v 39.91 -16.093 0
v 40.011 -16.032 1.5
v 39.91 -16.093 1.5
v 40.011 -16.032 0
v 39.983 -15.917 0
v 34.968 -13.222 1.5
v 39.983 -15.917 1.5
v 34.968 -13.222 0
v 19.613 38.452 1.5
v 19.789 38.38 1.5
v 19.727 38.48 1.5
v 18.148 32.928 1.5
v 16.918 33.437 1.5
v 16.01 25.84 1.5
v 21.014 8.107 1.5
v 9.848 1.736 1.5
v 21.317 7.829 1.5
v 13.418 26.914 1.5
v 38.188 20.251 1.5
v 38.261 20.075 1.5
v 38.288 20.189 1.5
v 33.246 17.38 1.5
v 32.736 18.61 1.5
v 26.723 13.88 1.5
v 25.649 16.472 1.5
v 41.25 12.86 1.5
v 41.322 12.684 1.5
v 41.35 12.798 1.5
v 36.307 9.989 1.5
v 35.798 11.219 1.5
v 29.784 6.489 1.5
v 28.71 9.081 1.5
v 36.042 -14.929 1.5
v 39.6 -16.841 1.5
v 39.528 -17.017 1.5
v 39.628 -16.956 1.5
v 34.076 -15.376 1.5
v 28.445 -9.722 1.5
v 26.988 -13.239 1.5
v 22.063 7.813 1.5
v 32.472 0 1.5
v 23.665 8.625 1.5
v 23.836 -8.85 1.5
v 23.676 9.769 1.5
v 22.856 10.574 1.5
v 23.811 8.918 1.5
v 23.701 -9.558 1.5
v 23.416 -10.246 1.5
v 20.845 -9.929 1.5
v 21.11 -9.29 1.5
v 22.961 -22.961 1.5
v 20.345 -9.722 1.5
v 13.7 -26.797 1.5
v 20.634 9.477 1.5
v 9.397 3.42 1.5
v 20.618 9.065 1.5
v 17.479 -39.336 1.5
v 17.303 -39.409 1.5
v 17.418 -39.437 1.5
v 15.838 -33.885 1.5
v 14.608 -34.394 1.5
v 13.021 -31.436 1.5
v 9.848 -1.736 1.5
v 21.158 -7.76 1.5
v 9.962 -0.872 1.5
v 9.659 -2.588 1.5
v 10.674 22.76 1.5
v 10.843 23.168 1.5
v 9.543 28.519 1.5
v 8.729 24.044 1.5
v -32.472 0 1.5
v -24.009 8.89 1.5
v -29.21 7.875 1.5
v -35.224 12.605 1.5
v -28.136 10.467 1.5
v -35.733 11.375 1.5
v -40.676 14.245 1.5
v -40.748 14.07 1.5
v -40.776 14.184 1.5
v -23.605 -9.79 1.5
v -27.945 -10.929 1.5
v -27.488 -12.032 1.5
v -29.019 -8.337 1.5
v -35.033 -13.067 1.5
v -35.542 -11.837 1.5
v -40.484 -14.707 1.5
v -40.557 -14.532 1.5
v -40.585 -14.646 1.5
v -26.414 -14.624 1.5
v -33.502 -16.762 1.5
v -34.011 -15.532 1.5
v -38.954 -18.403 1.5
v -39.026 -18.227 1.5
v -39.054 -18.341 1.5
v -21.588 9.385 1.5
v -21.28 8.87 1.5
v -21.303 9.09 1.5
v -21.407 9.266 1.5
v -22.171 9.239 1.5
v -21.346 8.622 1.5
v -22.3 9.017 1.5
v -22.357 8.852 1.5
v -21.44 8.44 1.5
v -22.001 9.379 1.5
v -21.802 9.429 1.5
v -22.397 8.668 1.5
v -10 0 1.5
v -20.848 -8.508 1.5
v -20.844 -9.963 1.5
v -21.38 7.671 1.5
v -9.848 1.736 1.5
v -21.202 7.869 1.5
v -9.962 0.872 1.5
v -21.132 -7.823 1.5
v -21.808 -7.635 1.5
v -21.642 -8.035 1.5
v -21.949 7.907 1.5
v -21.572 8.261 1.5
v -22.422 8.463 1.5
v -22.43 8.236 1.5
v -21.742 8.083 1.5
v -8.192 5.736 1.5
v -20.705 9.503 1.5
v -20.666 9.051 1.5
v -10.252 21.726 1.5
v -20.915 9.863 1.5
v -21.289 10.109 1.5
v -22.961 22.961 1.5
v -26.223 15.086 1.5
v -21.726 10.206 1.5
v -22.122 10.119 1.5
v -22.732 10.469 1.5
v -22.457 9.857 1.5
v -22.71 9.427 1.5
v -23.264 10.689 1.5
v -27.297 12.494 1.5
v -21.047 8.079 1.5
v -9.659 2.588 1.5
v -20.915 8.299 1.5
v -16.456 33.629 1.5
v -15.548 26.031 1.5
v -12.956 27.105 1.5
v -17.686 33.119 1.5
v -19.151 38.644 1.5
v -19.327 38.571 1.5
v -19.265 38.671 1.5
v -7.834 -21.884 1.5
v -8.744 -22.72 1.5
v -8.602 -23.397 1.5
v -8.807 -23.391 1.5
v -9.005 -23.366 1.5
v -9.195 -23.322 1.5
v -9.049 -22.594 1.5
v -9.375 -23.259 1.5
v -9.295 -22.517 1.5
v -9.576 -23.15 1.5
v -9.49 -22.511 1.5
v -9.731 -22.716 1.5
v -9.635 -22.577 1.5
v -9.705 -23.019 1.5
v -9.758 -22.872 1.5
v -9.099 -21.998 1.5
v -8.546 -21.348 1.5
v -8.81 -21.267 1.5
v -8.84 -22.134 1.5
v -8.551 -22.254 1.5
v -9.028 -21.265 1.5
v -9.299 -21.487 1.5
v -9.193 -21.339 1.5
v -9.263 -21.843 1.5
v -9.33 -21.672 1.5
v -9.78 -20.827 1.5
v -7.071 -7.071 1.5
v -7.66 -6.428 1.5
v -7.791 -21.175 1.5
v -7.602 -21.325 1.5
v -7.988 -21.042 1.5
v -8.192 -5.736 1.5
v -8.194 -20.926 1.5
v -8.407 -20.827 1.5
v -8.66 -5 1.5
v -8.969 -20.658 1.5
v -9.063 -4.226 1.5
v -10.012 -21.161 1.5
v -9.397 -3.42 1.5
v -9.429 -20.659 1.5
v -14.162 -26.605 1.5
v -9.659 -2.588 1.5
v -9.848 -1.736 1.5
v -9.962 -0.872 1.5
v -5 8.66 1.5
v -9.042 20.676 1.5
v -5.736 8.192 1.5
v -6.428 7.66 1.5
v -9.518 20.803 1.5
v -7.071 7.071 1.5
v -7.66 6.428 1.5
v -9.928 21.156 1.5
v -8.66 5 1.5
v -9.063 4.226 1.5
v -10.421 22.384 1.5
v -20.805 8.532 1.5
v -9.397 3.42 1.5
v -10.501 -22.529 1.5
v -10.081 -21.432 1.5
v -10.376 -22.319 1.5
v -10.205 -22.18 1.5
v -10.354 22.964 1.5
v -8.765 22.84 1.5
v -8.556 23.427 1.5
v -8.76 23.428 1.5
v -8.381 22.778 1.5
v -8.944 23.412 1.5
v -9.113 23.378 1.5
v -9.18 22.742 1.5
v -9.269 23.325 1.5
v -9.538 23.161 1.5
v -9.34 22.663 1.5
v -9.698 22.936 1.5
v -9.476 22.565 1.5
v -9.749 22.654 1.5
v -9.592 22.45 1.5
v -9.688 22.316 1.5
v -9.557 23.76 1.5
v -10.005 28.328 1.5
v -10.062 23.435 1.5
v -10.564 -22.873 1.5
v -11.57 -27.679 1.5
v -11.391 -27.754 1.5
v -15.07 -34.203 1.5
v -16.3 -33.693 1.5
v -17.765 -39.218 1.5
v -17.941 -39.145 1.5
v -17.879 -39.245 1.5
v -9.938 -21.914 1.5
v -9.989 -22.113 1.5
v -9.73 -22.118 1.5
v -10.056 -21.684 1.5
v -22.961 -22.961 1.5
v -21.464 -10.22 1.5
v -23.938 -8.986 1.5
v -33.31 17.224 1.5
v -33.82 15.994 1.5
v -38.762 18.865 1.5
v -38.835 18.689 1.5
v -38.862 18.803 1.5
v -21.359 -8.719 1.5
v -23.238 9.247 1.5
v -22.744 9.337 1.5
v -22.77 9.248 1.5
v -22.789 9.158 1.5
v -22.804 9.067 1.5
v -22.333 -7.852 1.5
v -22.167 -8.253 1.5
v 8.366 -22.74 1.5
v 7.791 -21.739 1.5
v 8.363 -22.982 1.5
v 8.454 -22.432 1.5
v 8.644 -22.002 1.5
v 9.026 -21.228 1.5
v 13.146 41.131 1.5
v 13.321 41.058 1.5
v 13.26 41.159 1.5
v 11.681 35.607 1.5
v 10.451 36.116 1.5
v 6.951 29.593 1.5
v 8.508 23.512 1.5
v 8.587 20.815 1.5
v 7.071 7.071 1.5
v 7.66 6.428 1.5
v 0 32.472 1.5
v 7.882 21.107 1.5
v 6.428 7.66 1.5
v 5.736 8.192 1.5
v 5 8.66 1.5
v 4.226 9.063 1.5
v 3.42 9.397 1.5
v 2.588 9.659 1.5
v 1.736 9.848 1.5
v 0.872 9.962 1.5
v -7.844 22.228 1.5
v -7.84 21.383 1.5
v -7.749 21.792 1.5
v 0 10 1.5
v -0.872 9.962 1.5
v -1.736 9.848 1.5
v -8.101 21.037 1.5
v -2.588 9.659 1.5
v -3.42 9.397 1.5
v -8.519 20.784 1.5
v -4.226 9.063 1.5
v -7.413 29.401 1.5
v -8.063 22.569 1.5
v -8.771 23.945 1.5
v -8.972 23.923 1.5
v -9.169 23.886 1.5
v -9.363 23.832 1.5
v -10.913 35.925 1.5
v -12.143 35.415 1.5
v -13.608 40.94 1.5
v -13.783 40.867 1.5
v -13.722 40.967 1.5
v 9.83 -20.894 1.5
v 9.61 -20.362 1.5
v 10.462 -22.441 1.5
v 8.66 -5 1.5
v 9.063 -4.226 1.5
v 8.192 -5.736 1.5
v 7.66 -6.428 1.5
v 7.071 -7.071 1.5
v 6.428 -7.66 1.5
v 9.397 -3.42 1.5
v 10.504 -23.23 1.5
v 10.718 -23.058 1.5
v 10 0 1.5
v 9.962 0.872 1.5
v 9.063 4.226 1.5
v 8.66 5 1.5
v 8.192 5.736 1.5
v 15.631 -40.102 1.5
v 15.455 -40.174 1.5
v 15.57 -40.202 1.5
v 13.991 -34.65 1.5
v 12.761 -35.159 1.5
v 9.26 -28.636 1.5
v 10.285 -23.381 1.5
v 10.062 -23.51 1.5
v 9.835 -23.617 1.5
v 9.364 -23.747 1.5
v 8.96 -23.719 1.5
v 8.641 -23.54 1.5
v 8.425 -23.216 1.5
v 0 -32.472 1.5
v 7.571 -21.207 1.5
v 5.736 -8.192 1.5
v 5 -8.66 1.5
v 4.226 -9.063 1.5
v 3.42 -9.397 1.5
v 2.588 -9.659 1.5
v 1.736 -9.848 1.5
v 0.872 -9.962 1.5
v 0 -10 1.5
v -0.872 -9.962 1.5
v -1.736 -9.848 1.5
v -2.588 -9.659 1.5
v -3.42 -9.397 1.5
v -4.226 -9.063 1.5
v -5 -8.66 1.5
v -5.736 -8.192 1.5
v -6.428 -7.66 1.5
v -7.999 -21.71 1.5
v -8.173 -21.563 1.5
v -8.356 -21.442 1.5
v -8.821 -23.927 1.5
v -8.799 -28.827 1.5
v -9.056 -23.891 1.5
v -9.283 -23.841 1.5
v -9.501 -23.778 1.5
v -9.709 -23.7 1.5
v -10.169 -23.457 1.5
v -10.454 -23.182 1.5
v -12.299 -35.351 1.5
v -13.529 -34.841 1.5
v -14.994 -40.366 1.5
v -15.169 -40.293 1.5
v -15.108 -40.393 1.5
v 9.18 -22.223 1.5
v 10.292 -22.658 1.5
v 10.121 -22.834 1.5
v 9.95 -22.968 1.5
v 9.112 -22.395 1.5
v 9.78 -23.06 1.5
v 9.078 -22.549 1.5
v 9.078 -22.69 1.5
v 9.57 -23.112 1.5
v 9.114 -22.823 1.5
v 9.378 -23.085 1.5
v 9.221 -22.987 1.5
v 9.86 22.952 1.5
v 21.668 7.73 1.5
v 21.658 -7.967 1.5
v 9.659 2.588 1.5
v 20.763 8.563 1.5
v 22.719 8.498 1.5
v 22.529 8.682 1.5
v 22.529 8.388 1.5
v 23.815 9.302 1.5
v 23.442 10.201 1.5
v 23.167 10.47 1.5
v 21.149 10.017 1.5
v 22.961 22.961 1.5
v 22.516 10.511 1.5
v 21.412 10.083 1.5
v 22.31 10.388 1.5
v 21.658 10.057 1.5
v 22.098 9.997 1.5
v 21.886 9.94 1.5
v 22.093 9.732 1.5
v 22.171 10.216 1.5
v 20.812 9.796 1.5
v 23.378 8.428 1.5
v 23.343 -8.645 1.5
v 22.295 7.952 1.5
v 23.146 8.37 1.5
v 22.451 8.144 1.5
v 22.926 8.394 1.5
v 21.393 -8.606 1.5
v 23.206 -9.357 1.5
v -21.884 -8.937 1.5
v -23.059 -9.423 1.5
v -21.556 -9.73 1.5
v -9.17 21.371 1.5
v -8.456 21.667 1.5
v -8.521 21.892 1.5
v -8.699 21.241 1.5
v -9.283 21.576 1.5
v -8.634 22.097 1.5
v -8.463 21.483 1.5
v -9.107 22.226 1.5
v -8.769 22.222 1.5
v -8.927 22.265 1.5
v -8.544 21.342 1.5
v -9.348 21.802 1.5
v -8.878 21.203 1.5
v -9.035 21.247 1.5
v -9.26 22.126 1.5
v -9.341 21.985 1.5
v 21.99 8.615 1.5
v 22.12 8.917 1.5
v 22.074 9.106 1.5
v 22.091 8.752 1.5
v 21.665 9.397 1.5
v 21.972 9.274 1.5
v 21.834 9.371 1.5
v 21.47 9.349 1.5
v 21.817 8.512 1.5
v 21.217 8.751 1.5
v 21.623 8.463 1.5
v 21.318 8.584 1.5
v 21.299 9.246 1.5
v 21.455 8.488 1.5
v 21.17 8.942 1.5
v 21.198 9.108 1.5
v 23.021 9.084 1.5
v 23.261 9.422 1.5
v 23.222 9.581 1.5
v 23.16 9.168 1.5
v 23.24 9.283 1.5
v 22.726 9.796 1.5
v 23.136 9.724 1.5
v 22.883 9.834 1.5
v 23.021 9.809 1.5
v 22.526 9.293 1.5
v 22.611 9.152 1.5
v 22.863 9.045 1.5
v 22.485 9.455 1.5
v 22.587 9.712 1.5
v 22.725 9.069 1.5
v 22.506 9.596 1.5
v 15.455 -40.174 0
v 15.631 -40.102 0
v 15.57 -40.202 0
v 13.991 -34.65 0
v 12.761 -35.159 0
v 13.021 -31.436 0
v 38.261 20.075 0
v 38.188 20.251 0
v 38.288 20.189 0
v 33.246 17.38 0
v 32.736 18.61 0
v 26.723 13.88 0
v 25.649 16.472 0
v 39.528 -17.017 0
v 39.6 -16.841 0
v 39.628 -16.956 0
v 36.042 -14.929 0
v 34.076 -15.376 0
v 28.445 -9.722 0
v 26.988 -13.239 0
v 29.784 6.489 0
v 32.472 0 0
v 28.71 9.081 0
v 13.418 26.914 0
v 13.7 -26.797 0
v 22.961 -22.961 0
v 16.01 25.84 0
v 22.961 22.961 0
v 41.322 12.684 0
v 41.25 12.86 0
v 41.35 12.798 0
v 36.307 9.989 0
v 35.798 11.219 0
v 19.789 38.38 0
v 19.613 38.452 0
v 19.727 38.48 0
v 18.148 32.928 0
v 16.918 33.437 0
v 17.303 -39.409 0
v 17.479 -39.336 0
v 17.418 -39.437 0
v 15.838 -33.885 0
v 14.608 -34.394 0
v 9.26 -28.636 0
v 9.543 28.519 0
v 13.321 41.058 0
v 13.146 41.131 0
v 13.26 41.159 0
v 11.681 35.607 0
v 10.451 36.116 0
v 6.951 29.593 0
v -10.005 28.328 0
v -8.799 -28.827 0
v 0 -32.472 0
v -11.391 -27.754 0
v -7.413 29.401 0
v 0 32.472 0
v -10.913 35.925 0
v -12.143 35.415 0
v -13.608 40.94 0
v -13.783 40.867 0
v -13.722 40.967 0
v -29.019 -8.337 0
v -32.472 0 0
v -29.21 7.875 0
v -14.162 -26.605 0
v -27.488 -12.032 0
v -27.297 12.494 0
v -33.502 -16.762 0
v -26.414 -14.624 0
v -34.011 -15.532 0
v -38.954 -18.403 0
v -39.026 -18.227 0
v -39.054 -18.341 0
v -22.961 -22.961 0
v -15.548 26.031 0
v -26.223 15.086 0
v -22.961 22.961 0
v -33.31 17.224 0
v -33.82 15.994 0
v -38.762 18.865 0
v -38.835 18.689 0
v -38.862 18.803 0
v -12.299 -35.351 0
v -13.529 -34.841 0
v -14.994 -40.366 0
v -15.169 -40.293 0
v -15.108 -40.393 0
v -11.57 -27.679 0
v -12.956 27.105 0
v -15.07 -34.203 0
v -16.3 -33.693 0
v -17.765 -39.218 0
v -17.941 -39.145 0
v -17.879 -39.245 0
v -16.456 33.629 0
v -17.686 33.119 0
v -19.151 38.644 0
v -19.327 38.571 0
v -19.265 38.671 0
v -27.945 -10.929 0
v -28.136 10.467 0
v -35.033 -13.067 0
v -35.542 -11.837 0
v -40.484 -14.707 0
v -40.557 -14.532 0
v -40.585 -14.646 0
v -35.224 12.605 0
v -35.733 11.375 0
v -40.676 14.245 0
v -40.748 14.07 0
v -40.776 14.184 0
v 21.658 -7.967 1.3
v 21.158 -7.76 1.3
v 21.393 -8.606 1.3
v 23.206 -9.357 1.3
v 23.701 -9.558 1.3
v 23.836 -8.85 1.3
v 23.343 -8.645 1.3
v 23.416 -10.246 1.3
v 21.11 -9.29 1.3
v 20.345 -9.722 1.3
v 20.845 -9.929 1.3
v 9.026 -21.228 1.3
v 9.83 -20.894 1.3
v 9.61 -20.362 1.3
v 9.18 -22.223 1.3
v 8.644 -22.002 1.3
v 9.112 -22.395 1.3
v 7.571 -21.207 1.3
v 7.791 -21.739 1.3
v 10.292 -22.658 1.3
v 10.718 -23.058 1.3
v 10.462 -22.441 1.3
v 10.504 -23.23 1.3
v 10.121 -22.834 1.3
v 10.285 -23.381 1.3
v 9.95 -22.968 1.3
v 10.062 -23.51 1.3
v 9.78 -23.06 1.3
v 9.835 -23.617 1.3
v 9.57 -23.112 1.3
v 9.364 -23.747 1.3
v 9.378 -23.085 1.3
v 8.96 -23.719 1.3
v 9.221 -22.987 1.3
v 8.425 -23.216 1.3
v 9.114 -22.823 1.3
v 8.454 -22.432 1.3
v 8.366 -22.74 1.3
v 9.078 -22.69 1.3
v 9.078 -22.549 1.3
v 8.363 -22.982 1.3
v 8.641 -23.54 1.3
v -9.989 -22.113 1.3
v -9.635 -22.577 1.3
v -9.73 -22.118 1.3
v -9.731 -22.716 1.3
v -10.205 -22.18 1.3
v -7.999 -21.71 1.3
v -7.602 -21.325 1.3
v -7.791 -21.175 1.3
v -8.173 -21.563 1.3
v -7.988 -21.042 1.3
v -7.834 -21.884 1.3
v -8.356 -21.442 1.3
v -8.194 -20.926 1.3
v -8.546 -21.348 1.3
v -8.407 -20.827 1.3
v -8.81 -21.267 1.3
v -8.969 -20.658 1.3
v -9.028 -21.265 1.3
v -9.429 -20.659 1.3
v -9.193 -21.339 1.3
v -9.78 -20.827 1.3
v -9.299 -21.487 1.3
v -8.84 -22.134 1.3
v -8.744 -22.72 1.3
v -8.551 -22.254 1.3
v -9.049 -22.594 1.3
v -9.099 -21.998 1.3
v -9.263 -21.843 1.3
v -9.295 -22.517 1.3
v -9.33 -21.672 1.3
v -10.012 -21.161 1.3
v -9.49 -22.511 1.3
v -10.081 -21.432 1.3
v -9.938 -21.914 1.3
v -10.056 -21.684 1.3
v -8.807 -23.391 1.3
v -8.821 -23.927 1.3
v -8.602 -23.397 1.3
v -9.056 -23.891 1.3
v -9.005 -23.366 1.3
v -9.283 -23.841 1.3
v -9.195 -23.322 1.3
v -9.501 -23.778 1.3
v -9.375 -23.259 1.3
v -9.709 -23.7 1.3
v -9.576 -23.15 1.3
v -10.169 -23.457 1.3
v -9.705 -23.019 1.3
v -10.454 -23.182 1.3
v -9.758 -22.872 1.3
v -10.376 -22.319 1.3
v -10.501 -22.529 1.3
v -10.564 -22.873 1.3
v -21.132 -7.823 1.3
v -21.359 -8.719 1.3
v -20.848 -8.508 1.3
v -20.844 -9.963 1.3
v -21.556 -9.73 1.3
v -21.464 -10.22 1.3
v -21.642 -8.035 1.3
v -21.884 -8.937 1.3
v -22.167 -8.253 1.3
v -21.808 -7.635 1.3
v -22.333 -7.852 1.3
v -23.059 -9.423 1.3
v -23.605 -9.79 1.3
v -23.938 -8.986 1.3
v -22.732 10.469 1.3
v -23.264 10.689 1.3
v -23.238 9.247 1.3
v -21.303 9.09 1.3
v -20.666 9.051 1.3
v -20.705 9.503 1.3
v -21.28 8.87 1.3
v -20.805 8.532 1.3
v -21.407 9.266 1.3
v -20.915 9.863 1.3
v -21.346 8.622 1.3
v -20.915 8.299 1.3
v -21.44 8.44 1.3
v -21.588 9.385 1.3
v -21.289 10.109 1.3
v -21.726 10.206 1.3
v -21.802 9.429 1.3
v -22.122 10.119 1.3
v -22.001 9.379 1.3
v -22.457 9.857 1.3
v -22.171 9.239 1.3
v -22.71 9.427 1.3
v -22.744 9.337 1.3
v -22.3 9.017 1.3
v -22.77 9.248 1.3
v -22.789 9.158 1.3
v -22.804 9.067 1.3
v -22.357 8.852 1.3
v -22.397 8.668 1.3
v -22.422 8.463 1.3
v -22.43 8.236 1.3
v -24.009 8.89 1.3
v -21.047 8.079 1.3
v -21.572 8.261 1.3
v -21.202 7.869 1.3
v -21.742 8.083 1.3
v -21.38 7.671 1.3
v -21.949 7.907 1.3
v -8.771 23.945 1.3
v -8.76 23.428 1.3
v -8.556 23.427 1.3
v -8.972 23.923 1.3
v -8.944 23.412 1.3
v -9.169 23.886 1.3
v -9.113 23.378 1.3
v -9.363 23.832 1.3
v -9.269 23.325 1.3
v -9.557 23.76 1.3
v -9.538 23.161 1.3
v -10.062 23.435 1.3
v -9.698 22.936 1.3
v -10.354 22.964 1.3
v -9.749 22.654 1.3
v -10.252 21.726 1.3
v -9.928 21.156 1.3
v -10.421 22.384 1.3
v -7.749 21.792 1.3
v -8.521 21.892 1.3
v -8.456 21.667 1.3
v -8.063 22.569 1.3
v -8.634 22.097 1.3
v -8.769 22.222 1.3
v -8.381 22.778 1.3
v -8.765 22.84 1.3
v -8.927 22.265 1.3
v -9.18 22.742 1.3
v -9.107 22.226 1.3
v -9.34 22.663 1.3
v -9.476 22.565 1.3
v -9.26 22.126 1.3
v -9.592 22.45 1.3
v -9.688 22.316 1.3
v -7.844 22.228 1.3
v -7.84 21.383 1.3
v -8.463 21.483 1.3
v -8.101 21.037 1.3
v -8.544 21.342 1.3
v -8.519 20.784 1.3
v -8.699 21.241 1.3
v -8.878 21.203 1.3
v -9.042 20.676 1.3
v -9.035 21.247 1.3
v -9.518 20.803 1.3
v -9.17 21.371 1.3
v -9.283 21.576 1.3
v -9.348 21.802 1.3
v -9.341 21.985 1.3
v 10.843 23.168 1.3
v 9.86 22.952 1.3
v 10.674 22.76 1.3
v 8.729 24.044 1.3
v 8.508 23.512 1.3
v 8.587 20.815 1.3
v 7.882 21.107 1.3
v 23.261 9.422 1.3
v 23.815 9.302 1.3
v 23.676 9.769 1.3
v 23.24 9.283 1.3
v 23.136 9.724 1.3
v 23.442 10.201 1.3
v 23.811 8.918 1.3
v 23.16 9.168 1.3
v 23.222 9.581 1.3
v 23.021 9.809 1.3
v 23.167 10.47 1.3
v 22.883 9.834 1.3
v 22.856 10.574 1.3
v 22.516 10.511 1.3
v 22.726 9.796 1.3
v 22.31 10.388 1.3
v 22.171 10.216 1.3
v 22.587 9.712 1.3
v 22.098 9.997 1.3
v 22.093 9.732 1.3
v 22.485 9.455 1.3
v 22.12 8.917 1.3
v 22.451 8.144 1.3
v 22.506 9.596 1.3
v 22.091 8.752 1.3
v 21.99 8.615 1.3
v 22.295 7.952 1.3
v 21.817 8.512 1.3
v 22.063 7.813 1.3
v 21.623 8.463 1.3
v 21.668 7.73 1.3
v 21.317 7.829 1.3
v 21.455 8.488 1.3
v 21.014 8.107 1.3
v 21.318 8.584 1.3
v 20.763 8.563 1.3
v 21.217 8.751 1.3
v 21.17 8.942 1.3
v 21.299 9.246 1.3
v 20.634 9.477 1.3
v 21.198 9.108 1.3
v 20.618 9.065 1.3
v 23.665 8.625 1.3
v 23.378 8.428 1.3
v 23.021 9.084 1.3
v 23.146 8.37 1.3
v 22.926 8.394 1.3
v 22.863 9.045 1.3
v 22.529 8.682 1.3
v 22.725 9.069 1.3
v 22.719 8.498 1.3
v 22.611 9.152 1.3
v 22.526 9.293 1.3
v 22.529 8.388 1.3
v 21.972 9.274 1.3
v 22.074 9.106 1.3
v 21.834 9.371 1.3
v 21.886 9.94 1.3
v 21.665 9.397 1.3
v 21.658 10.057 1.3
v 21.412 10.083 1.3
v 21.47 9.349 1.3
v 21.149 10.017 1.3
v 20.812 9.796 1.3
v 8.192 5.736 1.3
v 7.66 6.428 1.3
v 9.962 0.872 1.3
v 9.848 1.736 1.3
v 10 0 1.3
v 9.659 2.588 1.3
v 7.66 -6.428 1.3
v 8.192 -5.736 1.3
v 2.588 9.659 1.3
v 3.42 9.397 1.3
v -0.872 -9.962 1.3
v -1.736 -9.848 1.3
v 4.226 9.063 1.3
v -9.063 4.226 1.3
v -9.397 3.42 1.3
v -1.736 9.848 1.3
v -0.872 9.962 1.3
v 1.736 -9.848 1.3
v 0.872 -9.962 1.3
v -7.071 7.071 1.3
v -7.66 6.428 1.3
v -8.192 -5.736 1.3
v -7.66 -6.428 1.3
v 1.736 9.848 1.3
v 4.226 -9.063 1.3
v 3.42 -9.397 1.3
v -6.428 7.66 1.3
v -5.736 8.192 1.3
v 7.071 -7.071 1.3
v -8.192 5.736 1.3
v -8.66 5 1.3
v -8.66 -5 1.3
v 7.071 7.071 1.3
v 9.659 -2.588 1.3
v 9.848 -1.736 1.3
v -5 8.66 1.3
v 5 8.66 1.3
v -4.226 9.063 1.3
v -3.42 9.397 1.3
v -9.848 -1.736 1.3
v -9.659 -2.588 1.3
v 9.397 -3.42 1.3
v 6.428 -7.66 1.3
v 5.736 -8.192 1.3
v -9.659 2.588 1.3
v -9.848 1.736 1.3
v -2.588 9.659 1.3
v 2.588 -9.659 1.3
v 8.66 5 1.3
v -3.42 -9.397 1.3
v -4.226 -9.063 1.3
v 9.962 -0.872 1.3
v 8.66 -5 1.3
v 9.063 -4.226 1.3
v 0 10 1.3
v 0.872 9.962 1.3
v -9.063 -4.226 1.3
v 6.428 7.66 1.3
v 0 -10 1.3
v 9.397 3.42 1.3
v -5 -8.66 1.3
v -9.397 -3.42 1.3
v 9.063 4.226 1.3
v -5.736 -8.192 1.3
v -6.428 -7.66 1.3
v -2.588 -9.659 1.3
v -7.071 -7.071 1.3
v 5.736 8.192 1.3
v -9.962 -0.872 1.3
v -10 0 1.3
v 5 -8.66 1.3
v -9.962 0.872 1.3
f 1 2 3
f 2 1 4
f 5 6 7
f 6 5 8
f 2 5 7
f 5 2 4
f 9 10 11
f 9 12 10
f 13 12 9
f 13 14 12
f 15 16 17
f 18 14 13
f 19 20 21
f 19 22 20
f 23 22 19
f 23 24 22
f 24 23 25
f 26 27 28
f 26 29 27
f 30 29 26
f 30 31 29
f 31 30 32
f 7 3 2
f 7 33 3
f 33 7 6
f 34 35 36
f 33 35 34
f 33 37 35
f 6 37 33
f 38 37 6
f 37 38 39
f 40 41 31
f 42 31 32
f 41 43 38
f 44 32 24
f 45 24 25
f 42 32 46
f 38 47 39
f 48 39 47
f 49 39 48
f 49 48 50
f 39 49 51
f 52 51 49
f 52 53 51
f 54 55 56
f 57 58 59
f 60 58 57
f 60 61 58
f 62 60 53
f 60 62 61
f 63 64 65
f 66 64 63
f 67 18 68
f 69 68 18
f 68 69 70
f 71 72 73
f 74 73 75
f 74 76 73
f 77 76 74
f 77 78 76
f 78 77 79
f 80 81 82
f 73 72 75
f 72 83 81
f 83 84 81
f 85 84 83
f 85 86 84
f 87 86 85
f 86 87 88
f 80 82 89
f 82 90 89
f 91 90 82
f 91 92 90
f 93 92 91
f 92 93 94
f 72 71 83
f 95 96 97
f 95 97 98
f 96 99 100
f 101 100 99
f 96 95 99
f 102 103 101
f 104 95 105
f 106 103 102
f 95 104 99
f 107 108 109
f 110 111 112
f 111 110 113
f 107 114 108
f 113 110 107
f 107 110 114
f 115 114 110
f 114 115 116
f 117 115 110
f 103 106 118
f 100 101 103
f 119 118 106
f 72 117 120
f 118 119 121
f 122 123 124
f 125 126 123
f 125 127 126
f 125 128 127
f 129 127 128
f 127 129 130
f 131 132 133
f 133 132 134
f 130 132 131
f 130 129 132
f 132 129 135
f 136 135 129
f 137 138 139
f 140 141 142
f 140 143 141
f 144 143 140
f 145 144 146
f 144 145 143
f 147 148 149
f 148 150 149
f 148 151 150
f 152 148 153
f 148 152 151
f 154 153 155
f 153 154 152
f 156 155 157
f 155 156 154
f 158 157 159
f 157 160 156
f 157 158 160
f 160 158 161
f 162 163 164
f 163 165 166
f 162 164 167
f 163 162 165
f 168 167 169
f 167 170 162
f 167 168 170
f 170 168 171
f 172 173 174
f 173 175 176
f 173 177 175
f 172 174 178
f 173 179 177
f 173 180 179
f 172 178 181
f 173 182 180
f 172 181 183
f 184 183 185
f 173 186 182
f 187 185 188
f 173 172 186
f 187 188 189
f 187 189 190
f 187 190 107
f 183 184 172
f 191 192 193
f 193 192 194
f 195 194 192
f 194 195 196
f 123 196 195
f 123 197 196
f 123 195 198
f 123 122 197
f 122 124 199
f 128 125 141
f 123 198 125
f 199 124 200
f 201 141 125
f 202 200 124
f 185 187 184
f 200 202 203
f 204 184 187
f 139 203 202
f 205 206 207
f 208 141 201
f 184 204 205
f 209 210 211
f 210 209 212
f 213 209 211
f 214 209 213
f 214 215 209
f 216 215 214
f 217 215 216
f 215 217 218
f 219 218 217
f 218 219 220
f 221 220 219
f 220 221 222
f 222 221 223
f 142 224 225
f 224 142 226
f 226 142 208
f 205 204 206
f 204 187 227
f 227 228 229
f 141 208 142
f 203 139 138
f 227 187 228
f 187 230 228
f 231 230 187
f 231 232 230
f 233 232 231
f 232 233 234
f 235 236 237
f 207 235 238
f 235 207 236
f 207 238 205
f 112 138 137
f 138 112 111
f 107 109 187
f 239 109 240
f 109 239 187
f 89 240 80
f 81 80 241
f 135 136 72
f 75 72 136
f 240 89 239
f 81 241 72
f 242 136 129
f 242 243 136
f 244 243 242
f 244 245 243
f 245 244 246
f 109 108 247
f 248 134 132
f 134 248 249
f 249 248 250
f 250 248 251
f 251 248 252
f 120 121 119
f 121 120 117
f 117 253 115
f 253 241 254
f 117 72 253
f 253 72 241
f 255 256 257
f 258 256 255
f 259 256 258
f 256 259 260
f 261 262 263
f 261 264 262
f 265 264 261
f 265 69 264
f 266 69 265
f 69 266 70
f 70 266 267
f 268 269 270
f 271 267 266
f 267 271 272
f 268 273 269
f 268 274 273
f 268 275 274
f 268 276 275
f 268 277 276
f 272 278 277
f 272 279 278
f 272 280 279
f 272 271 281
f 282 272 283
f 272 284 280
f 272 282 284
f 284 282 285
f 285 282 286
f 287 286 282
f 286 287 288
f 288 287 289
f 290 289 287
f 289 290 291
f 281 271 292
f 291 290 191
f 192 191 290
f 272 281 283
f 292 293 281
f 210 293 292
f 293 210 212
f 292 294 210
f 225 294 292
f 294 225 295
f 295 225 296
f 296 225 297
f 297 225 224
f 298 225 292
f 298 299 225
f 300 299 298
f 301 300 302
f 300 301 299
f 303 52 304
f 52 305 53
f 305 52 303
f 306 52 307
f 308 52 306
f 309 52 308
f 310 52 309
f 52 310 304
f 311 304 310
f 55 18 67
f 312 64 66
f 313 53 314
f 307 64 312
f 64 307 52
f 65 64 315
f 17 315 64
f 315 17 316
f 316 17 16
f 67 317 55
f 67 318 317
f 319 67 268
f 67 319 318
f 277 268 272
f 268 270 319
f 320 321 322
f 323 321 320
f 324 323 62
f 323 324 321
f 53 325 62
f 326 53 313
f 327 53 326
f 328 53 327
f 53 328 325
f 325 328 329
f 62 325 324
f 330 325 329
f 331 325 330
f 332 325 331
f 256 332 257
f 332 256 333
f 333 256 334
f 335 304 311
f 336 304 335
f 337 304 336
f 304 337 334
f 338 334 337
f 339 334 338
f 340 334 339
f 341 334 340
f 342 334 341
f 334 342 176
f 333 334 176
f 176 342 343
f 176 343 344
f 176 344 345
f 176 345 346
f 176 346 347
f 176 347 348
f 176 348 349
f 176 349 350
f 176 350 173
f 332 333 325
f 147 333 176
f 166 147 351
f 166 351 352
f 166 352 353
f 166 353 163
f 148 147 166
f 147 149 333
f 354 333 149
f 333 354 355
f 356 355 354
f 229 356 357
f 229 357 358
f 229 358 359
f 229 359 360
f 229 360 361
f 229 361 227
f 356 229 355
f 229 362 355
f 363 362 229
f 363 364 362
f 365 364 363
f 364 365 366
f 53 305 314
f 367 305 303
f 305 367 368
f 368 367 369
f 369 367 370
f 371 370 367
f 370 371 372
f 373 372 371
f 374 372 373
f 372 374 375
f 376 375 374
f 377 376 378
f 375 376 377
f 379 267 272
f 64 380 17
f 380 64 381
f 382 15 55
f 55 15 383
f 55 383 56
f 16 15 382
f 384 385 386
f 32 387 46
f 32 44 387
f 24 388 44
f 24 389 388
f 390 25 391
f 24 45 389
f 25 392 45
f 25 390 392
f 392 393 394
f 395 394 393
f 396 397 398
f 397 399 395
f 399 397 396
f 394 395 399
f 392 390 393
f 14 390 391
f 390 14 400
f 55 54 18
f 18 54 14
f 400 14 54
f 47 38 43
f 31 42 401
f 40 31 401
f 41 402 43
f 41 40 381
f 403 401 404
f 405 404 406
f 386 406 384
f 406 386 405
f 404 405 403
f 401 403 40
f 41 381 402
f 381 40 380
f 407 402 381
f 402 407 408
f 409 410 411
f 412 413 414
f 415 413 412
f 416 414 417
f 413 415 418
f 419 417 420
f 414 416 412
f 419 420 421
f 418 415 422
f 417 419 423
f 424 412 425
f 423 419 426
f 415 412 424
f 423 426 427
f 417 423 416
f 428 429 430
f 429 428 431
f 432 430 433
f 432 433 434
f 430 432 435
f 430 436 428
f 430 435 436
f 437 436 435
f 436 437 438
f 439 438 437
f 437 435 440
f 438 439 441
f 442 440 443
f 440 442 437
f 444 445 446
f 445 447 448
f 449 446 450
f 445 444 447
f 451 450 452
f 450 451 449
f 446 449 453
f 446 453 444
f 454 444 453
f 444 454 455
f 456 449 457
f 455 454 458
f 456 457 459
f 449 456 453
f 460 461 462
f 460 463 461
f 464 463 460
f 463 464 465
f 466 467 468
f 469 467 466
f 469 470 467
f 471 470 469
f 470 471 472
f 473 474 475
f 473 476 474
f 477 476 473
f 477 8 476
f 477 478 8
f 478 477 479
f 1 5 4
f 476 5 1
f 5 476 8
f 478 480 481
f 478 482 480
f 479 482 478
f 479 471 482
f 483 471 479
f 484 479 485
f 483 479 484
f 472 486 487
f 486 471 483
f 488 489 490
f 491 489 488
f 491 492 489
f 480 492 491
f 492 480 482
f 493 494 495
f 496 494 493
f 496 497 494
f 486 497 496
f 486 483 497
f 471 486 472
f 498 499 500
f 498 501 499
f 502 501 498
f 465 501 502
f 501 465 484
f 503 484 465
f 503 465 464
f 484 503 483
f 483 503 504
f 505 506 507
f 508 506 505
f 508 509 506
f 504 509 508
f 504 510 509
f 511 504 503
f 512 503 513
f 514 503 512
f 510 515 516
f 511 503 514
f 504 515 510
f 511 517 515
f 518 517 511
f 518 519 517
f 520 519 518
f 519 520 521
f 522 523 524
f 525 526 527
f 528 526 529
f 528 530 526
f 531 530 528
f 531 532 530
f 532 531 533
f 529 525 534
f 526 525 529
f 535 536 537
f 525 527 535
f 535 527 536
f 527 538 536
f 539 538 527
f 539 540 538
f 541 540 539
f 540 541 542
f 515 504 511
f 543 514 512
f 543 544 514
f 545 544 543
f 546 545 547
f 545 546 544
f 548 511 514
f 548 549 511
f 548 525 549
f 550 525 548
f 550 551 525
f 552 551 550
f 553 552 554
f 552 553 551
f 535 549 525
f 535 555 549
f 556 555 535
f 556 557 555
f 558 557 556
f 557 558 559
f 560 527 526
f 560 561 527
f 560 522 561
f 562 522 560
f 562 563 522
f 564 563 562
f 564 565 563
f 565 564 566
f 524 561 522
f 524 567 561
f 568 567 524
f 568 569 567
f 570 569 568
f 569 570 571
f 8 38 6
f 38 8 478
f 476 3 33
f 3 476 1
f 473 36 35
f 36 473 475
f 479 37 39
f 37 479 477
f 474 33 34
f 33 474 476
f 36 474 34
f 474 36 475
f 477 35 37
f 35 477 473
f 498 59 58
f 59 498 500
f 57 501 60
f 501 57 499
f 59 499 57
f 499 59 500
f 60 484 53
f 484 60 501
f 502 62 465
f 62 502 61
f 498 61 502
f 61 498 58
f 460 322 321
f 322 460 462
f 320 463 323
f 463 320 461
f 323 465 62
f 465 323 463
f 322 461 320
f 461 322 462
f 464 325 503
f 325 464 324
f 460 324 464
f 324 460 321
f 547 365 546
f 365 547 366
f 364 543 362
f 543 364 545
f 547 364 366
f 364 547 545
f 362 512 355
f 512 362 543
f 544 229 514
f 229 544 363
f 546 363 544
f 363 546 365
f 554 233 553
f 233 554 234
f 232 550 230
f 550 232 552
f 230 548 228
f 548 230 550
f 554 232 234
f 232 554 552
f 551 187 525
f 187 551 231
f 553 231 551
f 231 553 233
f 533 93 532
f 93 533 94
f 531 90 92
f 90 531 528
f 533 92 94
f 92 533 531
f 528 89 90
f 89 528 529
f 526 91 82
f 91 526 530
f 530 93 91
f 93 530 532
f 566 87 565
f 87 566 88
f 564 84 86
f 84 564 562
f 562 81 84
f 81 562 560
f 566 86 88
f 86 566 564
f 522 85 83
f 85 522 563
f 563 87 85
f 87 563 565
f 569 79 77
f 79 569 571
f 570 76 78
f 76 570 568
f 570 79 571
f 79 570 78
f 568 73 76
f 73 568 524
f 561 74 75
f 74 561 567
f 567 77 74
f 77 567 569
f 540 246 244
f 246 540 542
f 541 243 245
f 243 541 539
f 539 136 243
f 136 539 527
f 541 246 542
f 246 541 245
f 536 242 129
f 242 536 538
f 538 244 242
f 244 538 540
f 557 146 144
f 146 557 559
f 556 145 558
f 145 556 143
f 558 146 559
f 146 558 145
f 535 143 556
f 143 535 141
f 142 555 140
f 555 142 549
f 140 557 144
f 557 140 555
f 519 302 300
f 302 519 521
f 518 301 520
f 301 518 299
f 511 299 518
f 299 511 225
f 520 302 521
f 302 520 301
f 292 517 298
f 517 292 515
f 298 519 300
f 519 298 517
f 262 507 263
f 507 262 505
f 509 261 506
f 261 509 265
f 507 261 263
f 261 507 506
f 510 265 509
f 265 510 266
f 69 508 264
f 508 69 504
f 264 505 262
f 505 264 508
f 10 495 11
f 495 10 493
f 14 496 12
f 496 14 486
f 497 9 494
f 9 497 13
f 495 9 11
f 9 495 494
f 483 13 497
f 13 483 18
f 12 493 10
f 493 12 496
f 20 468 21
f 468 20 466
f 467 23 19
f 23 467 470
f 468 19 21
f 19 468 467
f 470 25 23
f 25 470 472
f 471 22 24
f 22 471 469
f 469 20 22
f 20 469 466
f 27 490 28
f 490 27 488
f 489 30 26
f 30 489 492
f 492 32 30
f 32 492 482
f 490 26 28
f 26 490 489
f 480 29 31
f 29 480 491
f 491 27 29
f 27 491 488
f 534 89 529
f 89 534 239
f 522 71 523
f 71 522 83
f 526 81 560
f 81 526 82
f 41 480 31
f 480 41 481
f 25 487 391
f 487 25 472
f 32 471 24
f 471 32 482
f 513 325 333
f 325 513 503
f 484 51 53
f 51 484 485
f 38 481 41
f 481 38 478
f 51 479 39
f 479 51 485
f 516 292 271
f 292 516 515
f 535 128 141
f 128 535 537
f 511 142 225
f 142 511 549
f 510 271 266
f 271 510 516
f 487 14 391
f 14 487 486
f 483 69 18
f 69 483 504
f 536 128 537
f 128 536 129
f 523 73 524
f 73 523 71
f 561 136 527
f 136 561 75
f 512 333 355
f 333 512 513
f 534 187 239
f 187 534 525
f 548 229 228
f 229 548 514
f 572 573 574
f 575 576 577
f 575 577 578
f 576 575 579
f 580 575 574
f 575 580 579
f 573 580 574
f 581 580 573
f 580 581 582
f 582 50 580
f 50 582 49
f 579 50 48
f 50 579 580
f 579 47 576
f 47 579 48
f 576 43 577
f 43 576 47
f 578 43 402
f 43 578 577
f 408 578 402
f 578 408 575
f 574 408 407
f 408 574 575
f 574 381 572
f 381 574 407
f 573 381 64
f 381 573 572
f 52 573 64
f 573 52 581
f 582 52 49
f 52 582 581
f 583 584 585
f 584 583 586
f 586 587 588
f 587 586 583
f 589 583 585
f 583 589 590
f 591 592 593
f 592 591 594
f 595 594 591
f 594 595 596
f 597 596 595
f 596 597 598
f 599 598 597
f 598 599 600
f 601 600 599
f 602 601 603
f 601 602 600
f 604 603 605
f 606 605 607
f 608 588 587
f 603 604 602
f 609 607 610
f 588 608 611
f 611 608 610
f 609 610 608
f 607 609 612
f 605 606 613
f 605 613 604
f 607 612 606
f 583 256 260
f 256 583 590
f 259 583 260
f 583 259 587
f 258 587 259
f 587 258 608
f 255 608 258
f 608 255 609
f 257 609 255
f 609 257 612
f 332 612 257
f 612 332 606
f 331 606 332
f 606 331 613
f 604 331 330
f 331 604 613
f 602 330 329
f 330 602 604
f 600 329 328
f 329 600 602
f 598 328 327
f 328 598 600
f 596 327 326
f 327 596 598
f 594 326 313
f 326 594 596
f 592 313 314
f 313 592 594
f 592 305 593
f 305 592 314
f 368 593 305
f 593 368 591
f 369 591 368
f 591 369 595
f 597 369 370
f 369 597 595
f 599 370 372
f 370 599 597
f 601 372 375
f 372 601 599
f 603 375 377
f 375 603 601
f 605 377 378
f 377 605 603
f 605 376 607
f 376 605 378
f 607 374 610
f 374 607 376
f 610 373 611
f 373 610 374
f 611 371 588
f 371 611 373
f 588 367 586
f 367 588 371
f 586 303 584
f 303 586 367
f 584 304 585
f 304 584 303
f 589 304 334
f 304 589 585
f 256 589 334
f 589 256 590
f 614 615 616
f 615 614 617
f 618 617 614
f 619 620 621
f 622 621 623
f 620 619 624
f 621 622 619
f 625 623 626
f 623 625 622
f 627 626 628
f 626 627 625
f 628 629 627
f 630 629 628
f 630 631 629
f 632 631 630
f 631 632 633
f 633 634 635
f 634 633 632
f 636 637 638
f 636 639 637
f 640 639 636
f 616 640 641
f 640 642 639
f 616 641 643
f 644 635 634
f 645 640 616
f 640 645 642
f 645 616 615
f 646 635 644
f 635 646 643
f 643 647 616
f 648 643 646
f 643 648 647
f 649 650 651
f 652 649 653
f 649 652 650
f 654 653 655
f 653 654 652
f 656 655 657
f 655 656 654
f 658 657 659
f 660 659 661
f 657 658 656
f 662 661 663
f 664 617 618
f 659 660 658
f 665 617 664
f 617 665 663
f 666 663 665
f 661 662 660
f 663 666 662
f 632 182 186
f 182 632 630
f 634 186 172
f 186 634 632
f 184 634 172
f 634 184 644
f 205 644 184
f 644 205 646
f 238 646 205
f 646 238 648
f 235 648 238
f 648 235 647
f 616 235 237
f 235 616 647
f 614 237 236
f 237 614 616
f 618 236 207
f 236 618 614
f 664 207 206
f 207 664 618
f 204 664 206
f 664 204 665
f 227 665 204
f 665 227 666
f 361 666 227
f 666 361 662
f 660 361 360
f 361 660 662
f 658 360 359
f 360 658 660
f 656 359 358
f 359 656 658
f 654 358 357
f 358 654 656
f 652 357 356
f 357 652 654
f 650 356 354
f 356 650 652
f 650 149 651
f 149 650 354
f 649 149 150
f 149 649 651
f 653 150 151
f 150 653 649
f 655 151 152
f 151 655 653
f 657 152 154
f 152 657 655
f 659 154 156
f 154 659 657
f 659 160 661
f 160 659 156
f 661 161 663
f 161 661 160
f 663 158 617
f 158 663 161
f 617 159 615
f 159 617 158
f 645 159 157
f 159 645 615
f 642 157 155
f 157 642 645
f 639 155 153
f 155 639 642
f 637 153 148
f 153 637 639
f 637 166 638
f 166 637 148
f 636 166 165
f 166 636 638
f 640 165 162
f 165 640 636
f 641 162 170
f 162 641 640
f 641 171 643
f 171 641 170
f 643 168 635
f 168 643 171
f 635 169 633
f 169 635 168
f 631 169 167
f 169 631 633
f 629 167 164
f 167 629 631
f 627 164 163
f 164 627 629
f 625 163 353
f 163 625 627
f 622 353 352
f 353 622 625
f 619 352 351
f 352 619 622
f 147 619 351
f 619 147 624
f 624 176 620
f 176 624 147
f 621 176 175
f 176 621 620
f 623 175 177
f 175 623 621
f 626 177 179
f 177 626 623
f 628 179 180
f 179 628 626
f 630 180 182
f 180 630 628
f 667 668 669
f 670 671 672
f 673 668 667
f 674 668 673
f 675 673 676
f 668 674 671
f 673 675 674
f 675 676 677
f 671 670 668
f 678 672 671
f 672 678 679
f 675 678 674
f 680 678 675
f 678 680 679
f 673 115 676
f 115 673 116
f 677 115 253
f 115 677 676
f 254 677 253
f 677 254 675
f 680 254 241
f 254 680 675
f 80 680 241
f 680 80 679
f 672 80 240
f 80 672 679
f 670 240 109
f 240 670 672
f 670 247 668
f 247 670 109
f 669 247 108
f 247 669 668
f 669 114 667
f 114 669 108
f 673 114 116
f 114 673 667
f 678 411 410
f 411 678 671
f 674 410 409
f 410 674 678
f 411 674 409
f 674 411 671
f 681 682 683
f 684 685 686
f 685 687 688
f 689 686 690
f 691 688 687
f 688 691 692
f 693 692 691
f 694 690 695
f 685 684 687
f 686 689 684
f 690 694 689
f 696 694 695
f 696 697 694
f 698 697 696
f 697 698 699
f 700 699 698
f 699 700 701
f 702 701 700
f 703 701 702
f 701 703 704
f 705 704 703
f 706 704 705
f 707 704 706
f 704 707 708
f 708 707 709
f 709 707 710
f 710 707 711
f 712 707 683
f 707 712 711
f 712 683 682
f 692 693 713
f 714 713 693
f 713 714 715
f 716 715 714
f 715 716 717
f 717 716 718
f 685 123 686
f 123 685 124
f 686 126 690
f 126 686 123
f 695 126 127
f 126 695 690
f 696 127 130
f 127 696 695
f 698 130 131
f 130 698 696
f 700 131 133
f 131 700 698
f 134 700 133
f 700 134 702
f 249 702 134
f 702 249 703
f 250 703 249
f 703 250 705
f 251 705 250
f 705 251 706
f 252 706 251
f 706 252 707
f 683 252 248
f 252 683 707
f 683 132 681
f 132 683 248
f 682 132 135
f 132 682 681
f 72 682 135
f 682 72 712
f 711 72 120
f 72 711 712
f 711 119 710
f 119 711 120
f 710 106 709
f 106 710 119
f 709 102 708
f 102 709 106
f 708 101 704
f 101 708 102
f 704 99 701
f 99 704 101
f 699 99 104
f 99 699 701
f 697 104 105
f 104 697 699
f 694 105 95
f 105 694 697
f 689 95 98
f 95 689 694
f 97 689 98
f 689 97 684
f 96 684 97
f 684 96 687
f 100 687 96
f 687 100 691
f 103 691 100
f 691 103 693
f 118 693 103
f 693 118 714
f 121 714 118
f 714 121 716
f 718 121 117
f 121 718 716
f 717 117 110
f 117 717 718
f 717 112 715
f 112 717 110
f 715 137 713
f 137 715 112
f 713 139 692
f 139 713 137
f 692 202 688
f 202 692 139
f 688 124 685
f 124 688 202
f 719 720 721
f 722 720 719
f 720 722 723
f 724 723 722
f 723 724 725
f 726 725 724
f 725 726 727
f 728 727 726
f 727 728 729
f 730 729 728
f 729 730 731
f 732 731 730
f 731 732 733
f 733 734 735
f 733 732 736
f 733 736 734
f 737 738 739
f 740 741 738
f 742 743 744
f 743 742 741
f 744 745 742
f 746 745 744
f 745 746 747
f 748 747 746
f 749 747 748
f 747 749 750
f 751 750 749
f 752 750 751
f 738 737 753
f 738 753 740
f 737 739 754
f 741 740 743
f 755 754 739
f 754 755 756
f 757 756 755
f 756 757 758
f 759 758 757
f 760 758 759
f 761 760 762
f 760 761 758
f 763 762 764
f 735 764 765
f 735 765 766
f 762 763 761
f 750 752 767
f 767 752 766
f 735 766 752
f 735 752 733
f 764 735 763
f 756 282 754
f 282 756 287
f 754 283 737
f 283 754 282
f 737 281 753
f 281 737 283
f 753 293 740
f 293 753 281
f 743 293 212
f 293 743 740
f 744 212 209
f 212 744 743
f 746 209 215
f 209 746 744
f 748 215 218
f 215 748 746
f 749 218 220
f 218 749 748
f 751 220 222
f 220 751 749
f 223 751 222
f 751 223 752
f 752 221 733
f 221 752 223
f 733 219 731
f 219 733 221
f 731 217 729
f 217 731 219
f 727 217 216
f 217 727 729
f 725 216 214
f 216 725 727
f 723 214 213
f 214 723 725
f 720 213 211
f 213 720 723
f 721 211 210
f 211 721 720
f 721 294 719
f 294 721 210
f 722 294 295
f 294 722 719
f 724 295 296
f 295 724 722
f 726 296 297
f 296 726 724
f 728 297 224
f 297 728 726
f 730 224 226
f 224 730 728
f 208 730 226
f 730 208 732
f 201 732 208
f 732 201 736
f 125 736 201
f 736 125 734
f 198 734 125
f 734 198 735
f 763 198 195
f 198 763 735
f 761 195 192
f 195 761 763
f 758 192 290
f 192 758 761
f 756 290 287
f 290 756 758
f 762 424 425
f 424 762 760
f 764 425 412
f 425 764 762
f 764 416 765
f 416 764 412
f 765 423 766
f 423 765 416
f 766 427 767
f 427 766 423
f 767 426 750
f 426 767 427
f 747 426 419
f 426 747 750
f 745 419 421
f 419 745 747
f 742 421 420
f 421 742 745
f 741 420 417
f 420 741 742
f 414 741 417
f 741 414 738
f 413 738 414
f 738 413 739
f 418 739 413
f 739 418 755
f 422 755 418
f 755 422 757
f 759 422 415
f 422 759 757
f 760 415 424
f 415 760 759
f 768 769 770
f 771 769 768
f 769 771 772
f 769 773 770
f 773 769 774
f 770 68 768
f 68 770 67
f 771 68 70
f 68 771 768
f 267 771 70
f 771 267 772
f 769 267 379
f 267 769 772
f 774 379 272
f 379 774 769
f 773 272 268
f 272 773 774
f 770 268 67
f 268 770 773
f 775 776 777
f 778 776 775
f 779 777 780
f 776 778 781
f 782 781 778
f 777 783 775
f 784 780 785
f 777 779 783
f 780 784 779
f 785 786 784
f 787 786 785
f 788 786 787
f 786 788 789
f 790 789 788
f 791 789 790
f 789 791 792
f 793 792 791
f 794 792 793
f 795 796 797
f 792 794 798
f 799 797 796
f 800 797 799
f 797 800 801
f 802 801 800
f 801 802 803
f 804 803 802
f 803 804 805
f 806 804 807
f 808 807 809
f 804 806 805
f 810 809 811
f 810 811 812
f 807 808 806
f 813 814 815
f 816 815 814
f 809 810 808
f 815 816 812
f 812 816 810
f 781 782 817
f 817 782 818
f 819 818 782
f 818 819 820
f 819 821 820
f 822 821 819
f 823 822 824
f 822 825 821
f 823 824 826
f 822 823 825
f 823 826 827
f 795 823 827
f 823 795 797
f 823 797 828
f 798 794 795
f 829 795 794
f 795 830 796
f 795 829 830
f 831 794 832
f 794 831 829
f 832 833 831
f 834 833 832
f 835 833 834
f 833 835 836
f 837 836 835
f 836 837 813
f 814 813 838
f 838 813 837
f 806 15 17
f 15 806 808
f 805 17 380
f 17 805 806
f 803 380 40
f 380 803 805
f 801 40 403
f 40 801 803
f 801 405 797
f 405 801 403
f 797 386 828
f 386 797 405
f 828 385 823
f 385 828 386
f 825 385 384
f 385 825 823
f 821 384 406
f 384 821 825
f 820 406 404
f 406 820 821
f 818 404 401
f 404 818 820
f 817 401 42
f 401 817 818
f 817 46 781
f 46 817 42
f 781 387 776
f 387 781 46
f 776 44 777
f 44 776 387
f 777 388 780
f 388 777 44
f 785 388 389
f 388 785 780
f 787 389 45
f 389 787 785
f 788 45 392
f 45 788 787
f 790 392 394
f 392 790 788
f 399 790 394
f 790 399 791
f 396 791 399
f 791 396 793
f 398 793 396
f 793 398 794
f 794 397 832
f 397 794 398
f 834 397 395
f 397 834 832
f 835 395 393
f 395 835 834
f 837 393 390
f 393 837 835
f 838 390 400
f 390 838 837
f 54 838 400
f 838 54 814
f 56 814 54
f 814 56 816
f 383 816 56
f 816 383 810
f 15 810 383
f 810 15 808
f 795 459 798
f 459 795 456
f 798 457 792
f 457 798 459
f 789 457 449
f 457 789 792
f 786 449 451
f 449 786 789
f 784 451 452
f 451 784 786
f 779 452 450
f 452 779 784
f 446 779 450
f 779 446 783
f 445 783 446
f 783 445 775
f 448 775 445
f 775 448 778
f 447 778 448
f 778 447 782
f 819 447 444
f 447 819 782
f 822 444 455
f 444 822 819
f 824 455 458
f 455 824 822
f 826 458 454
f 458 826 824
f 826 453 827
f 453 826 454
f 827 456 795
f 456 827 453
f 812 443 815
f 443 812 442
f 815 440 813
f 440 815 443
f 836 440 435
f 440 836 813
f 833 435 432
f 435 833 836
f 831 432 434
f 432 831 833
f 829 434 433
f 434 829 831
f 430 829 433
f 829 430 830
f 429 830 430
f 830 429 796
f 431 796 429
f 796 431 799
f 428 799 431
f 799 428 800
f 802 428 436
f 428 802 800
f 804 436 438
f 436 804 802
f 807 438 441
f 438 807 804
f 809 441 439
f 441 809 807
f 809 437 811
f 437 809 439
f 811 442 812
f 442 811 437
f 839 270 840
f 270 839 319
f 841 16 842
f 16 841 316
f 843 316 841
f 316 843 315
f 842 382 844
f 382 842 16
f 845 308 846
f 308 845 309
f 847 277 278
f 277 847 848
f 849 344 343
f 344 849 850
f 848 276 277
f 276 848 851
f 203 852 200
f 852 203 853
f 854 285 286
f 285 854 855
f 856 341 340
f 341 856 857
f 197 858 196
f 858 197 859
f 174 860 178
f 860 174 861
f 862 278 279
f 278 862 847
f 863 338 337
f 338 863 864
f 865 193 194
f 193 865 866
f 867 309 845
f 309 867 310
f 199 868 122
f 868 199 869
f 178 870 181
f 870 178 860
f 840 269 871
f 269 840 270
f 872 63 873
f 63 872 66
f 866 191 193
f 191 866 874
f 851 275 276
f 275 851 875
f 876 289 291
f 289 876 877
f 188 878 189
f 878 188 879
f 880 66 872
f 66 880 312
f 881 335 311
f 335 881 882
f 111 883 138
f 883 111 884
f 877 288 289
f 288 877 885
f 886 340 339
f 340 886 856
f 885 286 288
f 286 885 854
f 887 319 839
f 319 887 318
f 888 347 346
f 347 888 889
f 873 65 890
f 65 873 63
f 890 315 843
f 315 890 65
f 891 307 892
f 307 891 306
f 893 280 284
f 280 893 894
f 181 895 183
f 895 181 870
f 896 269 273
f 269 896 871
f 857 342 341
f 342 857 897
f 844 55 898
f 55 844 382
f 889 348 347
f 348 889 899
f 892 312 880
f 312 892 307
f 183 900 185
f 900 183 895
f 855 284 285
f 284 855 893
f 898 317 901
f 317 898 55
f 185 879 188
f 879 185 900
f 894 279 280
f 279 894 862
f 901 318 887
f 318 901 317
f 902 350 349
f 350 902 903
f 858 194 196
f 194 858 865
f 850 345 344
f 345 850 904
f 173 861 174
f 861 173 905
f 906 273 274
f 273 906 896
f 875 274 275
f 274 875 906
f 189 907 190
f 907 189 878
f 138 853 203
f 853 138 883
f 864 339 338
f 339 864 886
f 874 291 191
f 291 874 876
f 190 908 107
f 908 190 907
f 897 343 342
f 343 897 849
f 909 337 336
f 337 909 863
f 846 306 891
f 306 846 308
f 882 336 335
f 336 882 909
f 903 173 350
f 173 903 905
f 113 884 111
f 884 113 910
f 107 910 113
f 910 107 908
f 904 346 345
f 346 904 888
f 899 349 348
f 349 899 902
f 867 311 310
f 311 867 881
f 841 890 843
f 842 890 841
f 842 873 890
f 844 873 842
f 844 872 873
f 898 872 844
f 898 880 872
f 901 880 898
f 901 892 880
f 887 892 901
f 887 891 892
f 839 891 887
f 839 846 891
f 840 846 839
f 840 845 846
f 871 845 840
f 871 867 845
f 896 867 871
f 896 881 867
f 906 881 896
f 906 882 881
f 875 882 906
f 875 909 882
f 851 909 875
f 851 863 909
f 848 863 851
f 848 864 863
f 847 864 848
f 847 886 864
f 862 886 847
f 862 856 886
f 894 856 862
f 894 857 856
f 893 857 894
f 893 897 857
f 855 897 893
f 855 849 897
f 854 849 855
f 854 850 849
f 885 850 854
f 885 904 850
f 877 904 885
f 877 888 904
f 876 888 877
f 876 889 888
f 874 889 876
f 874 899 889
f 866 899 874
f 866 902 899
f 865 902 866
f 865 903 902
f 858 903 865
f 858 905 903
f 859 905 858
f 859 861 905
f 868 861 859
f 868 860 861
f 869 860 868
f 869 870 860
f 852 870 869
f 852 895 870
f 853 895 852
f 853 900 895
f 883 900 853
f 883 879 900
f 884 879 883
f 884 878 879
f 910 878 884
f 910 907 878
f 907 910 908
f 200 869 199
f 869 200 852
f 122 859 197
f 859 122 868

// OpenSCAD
// 2-Point Discrimination Wheel — parametric n-gon, clockwise order
distances_mm       = is_undef(distances_mm) ? [1,2,3,4,5,6,7,8] : distances_mm;
outer_flat_to_flat = is_undef(outer_flat_to_flat) ? 60 : outer_flat_to_flat;
base_thickness     = is_undef(base_thickness) ? 1.5 : base_thickness;
spike_length  = is_undef(spike_length) ? 13 : spike_length;
base_d        = is_undef(base_d) ? 3 : base_d;
shank_d       = is_undef(shank_d) ? 1.4 : shank_d;
tip_d         = is_undef(tip_d) ? 0.2 : tip_d;
root_overlap  = is_undef(root_overlap) ? 0.7 : root_overlap;
label_size    = is_undef(label_size) ? 3 : label_size;
label_depth   = is_undef(label_depth) ? 1 : label_depth;
font_name     = is_undef(font_name) ? "DejaVu Sans:style=Bold" : font_name;
label_radial  = is_undef(label_radial) ? 0.80 : label_radial;
hub_diameter  = is_undef(hub_diameter) ? 20 : hub_diameter;
thumb_depth   = is_undef(thumb_depth) ? 1 : thumb_depth;
chamfer = is_undef(chamfer) ? 0.8 : chamfer;
$fn = is_undef($fn) ? 72 : $fn;

module soft_chamfer(h=chamfer){
  if (h>0) minkowski(){ children(); cylinder(h=h,r1=h,r2=0,$fn=24); }
  else children();
}
function apothem(across_flats,n)=across_flats/2;
function circ_radius(across_flats,n)=across_flats/(2*cos(180/n));
function total_thickness()=base_thickness+max(chamfer,0);

module polygon_plate(n, across_flats, thk){
  r = circ_radius(across_flats,n);
  linear_extrude(thk)
    polygon(points=[for(i=[0:n-1]) let(a=360*i/n)[r*cos(a), r*sin(a)]]);
}


module spike_single_flat(len=spike_length,bd=base_d,sd=shank_d,td=tip_d){
  base_r=bd/2; shank_r=sd/2; tip_r=td/2;
  bx=-root_overlap; sx=len*0.55; tx=len;
  linear_extrude(height=base_thickness)
  union(){
    translate([bx,0]) circle(r=base_r);
    hull(){translate([bx,0])circle(r=base_r);translate([sx,0])circle(r=shank_r);}
    hull(){translate([sx,0])circle(r=shank_r);translate([tx,0])circle(r=tip_r);}
  }
}

module thumb_well_top(){
  translate([0,0,total_thickness()-thumb_depth])
    cylinder(h=thumb_depth,d=hub_diameter,$fn=72);
}

module edge_numbers_top(distances,a){
  n=len(distances);
  for(i=[0:n-1]){
    angN=-360*(i+0.5)/n;
    translate([(label_radial*a)*cos(angN),
               (label_radial*a)*sin(angN),
               total_thickness()-label_depth])
      rotate([0,0,angN-90])
        linear_extrude(height=label_depth)
          text(str(distances[i]),
               size=label_size,font=font_name,
               halign="center",valign="center");
  }
}

module wheel_solid(distances){
  n=len(distances);
  a=apothem(outer_flat_to_flat,n);
  union(){
    polygon_plate(n,outer_flat_to_flat,base_thickness);
    for(i=[0:n-1]){
      angN=-360*(i+0.5)/n;
      translate([a*cos(angN),a*sin(angN),0])
        rotate([0,0,angN]){
          sep=distances[i];
          translate([0,+sep/2,0])spike_single_flat();
          translate([0,-sep/2,0])spike_single_flat();
        }
    }
  }
}

module discriminator(distances){
  n=len(distances);
  assert(n>=3,"distances_mm must have at least 3 entries.");
  difference(){
    wheel_solid(distances);
    thumb_well_top();
    edge_numbers_top(distances,apothem(outer_flat_to_flat,n));
  }
}

discriminator(distances_mm);
